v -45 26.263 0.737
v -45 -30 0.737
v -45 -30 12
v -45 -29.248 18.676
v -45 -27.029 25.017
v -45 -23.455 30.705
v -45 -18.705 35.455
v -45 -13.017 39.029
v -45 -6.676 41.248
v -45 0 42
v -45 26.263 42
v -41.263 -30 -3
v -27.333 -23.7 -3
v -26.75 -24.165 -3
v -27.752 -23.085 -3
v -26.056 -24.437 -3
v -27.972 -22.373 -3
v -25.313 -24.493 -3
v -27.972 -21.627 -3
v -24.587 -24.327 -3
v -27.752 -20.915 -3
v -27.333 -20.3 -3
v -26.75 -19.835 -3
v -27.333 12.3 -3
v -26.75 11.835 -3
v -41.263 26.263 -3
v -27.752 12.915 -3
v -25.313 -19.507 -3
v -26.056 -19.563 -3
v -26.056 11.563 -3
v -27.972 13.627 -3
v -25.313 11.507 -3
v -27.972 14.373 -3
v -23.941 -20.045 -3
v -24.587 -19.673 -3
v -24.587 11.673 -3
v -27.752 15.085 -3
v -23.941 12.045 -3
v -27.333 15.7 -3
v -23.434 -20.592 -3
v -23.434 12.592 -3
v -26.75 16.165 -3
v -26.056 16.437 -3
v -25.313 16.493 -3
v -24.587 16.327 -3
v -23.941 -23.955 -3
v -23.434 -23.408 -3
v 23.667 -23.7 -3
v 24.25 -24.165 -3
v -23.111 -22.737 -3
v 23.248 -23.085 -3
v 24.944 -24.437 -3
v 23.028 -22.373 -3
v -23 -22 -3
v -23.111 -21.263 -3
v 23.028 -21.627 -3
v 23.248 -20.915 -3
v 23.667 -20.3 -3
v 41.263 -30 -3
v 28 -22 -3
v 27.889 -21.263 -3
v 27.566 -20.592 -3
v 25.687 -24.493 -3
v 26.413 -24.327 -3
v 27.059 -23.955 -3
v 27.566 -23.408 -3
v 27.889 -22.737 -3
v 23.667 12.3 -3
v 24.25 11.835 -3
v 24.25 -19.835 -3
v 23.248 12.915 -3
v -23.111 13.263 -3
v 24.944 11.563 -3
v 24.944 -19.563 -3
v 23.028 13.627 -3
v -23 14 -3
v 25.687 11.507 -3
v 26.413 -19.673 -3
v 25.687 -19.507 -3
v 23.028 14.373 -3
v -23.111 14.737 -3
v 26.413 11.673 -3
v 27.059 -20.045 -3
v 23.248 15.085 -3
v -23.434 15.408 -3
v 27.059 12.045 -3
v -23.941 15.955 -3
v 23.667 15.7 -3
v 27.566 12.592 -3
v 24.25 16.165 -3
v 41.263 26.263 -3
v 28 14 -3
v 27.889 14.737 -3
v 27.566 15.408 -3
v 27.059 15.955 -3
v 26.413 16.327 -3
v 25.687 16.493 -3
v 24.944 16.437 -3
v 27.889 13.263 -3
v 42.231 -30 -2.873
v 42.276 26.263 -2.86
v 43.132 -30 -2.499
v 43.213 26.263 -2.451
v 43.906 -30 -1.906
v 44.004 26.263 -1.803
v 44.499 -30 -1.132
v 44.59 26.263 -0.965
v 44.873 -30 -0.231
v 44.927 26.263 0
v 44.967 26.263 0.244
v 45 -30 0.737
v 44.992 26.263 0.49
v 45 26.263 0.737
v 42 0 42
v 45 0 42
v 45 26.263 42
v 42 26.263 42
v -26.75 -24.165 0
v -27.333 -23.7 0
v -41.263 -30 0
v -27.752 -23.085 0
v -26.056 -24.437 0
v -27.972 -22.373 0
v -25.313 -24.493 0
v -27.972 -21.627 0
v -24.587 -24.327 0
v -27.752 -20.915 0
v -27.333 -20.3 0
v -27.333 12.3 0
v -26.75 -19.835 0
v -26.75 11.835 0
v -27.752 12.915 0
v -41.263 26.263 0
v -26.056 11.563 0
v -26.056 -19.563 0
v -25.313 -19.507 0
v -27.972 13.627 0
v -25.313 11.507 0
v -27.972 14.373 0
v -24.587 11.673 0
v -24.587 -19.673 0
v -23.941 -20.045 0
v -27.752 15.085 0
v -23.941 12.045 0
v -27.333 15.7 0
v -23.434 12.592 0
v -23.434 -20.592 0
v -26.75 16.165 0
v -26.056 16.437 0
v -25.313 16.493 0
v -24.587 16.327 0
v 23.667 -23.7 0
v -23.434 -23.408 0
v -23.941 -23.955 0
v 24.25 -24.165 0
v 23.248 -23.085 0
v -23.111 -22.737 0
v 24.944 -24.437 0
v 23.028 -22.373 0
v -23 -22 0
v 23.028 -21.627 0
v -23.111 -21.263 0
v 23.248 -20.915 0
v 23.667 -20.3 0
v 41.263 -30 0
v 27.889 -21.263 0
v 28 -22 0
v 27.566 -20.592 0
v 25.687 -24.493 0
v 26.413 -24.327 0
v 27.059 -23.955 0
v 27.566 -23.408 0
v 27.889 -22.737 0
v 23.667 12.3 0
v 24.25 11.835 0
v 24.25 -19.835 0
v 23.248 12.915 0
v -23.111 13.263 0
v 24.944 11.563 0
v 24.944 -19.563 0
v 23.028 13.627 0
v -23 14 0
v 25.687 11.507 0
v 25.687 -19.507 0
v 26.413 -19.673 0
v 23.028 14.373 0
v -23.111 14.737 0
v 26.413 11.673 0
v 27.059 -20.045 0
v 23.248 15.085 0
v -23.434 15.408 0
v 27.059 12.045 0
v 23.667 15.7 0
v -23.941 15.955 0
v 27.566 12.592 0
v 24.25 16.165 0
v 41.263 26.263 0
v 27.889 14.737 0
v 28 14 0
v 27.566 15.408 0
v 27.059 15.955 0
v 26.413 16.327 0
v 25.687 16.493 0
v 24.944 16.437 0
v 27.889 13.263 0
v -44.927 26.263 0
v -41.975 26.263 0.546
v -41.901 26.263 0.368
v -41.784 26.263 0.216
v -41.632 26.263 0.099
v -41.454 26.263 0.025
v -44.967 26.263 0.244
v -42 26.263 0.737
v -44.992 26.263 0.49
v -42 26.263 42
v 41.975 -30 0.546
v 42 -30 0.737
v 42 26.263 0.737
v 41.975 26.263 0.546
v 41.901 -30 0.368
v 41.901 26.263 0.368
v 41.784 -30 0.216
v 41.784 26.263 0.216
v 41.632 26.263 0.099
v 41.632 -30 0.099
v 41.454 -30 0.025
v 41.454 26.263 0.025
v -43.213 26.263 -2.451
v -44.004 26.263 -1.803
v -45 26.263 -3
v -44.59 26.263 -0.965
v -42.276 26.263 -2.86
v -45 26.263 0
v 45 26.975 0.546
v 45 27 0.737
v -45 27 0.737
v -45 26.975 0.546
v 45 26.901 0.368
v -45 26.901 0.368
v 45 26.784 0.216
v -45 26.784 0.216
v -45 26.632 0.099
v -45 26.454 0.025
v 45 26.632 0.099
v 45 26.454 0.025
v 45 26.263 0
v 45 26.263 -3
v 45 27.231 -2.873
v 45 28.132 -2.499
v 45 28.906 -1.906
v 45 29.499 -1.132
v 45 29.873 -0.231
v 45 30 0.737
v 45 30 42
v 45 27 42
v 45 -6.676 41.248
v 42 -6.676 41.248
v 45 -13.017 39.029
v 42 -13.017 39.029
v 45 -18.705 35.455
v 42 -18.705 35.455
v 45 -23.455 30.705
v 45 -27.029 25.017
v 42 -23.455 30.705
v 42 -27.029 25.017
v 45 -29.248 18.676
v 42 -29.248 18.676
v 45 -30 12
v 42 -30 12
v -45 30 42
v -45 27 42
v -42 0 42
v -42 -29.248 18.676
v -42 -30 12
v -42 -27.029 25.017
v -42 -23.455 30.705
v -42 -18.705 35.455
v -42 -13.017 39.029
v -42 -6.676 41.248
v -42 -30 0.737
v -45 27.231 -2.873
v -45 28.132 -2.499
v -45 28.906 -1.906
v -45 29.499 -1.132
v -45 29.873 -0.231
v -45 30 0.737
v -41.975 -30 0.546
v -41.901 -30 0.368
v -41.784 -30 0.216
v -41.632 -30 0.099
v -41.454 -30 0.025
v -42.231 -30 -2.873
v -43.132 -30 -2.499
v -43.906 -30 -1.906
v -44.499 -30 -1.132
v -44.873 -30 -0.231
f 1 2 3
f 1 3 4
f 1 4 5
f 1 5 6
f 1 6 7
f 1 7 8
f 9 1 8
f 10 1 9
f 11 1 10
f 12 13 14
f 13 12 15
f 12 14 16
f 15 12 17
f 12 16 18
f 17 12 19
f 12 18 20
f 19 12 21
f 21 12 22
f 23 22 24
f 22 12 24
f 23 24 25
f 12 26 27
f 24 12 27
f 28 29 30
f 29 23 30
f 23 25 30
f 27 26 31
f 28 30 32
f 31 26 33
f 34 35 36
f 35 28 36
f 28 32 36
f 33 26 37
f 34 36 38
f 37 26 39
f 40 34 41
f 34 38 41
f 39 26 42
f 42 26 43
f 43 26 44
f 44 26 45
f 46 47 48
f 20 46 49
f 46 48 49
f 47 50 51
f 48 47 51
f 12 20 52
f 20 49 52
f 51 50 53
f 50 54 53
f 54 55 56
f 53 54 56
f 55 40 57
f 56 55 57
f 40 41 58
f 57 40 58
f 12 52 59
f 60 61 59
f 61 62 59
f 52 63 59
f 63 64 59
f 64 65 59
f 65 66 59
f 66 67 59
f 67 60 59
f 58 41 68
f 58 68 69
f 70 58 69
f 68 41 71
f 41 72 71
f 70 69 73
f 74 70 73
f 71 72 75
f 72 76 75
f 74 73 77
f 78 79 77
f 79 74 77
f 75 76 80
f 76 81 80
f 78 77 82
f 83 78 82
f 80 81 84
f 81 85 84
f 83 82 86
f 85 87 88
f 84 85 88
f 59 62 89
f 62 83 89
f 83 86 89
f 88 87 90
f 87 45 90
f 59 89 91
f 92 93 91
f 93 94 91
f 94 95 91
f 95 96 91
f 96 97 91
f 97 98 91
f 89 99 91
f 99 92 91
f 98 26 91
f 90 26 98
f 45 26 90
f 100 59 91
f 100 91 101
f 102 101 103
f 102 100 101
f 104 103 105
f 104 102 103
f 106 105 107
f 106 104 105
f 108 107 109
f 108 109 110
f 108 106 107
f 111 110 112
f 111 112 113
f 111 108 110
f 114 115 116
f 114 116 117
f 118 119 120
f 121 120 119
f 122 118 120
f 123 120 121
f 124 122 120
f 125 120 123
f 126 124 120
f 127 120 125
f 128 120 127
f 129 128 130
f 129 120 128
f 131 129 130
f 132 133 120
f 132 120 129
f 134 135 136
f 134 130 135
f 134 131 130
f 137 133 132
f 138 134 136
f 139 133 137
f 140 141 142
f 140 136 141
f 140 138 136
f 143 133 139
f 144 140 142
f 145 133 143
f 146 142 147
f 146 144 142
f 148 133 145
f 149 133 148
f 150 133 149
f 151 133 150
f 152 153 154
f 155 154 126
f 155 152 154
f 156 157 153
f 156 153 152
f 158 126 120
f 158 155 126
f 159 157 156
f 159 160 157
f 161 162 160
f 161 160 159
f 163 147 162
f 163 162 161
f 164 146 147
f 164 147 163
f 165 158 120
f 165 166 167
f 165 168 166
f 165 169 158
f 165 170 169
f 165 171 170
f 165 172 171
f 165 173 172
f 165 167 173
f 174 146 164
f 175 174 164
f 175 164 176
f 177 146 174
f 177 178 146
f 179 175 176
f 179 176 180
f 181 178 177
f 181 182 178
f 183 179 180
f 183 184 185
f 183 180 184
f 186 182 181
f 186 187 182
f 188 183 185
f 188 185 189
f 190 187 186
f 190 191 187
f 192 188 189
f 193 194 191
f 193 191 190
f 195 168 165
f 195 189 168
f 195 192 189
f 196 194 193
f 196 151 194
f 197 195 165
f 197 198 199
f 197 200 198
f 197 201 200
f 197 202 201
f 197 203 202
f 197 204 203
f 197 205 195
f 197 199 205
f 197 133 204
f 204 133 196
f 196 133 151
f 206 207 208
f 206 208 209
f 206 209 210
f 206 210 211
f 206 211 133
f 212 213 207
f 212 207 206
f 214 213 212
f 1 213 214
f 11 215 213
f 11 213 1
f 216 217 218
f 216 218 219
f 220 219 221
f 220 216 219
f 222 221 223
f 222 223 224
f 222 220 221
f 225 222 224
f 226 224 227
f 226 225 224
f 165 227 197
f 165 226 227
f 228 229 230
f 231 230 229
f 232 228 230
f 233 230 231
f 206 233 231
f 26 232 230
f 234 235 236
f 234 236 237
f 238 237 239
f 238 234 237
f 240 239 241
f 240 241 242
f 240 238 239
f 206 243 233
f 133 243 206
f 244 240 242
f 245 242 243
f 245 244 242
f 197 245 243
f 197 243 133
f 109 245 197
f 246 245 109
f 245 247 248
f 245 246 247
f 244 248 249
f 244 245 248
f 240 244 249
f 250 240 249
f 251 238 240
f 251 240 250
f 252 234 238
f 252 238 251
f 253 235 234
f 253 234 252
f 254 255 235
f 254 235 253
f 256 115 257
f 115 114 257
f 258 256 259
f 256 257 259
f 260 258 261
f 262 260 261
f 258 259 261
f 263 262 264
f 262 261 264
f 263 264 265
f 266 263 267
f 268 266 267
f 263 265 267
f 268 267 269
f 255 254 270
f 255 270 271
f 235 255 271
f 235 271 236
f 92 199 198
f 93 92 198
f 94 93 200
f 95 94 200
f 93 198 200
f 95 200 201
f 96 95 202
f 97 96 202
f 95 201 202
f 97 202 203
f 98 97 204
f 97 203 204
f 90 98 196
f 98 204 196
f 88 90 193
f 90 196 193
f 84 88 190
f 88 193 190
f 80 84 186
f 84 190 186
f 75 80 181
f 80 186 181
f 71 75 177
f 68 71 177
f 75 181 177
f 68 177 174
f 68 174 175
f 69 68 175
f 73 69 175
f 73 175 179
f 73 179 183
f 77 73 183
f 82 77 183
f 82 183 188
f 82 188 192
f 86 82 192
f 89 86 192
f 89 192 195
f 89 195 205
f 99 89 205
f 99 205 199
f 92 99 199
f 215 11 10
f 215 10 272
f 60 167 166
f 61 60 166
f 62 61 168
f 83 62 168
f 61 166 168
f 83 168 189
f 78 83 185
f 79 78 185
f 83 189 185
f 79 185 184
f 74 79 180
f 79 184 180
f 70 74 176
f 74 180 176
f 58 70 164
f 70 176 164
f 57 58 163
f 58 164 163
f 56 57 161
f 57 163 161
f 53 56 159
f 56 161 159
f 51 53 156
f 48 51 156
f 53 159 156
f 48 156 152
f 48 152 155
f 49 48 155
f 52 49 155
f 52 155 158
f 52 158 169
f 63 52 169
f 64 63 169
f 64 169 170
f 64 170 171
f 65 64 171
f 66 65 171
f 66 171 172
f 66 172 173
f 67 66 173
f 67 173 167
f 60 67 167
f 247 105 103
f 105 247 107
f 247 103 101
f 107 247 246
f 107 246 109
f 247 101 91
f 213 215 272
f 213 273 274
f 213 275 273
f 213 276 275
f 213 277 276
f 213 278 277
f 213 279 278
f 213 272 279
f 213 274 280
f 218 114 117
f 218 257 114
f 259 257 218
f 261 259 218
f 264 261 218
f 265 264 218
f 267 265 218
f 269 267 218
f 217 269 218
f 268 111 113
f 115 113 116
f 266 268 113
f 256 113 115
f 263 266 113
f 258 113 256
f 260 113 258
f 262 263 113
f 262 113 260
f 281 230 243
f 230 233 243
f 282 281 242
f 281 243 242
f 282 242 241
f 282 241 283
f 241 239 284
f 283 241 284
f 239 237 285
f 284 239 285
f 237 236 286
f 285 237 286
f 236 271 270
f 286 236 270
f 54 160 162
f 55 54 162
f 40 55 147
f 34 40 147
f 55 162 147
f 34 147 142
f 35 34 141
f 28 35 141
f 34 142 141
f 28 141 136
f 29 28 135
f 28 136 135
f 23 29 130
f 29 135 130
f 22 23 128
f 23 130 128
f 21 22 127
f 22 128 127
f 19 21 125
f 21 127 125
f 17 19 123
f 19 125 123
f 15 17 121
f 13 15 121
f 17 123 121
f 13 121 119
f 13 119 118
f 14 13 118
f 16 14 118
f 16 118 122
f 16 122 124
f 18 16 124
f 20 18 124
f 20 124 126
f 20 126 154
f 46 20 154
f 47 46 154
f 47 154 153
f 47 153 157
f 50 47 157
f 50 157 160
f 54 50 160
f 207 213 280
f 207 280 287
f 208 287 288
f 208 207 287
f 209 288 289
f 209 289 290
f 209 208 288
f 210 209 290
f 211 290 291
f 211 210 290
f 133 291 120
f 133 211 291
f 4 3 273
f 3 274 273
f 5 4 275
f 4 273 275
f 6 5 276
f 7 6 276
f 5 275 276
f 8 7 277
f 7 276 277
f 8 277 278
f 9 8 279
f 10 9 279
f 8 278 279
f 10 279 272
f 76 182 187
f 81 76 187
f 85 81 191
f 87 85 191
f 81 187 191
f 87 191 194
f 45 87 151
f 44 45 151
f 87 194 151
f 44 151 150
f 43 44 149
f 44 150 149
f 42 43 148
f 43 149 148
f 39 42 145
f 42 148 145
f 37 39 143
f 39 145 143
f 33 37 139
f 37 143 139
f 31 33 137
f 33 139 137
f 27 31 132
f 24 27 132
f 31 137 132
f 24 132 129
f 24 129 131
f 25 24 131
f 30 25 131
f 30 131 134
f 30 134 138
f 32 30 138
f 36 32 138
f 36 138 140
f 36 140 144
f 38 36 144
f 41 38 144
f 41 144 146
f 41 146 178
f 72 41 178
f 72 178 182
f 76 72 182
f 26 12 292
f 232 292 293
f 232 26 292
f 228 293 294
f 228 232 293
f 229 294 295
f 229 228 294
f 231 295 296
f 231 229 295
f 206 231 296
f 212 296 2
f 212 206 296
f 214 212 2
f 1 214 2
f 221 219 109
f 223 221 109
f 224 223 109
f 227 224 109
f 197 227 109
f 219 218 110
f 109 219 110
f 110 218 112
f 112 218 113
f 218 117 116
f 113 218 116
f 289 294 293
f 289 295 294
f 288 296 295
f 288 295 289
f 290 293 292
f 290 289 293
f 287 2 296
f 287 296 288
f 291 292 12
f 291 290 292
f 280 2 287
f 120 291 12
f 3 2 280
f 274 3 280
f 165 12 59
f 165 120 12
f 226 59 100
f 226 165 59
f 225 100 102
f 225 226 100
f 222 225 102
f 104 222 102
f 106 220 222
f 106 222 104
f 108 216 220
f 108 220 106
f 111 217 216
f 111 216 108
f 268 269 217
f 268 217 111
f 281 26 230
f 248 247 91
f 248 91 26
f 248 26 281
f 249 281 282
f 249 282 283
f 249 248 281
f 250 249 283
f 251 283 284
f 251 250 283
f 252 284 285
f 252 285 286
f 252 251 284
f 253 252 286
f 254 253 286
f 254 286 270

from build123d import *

# Parameters (mm, degrees)
SKETCH_2_W                         = 90
SKETCH_2_H                         = 60
SM_BASE_FLANGE_1_DEPTH             = 3
SM_EDGE_FLANGE_1_STRIP_W           = 13.4732
SM_EDGE_FLANGE_1_STRIP_H           = 3
SM_EDGE_FLANGE_1_STRIP_CUT_DEPTH   = 90
SM_EDGE_FLANGE_1_DEPTH             = 90
SM_EDGE_FLANGE_2_STRIP_W           = 13.4732
SM_EDGE_FLANGE_2_STRIP_H           = 3
SM_EDGE_FLANGE_2_STRIP_CUT_DEPTH   = 56.2634
SM_EDGE_FLANGE_2_STRIP_2_W         = 13.4732
SM_EDGE_FLANGE_2_STRIP_2_H         = 3
SM_EDGE_FLANGE_2_STRIP_CUT_2_DEPTH = 56.2634
SM_EDGE_FLANGE_2_DEPTH             = 56.2634
SM_EDGE_FLANGE_2_BEND_DEPTH        = 56.2634
HOLE_WIZARD_M6_1_D                 = 5
FILLET_1_R                         = 30


# Sheet-metal steps are written as plain solids
with BuildPart() as part:
    # Sketch 2 → 基体-法兰1 (new body)
    with BuildSketch(Plane.XY):
        Rectangle(SKETCH_2_W, SKETCH_2_H)
    extrude(amount=-SM_BASE_FLANGE_1_DEPTH)

    # 边线-法兰1 strip (across the edge) → 边线-法兰1 strip cut (cut)
    with BuildSketch(Plane(origin=(45, 30, 0), x_dir=(0, -1, 0), z_dir=(-1, 0, 0))):
        with Locations((-3, -1.5)):
            Rectangle(SM_EDGE_FLANGE_1_STRIP_W, SM_EDGE_FLANGE_1_STRIP_H)
    extrude(amount=SM_EDGE_FLANGE_1_STRIP_CUT_DEPTH, mode=Mode.SUBTRACT)

    # 边线-法兰1 section (across the edge) → 边线-法兰1 (add)
    with BuildSketch(Plane(origin=(45, 30, 0), x_dir=(0, -1, 0), z_dir=(-1, 0, 0))):
        with BuildLine():
            Line((0, 0.7366), (0, 42))
            Line((0, 42), (3, 42))
            Line((3, 42), (3, 0.7366))
            ThreePointArc((3, 0.7366), (3.215745145, 0.215745145), (3.7366, 0))
            Line((3.7366, 0), (3.7366, -3))
            ThreePointArc((3.7366, -3), (1.094424801, -1.905575199), (0, 0.7366))
        make_face()
    extrude(amount=SM_EDGE_FLANGE_1_DEPTH)

    # 边线-法兰2 strip (across the edge) → 边线-法兰2 strip cut (cut)
    with BuildSketch(Plane(origin=(-45, 26.2634, 0), x_dir=(1, 0, 0), z_dir=(0, -1, 0))):
        with Locations((-3, -1.5)):
            Rectangle(SM_EDGE_FLANGE_2_STRIP_W, SM_EDGE_FLANGE_2_STRIP_H)
    extrude(amount=SM_EDGE_FLANGE_2_STRIP_CUT_DEPTH, mode=Mode.SUBTRACT)

    # 边线-法兰2 strip 2 (across the edge) → 边线-法兰2 strip cut 2 (cut)
    with BuildSketch(Plane(origin=(45, -30, 0), x_dir=(-1, 0, 0), z_dir=(0, 1, 0))):
        with Locations((-3, -1.5)):
            Rectangle(SM_EDGE_FLANGE_2_STRIP_2_W, SM_EDGE_FLANGE_2_STRIP_2_H)
    extrude(amount=SM_EDGE_FLANGE_2_STRIP_CUT_2_DEPTH, mode=Mode.SUBTRACT)

    # 边线-法兰2 section (across the edge) → 边线-法兰2 (add)
    with BuildSketch(Plane(origin=(-45, 26.2634, 0), x_dir=(1, 0, 0), z_dir=(0, -1, 0))):
        with BuildLine():
            Line((0, 0.7366), (0, 42))
            Line((0, 42), (3, 42))
            Line((3, 42), (3, 0.7366))
            ThreePointArc((3, 0.7366), (3.215745145, 0.215745145), (3.7366, 0))
            Line((3.7366, 0), (3.7366, -3))
            ThreePointArc((3.7366, -3), (1.094424801, -1.905575199), (0, 0.7366))
        make_face()
    extrude(amount=SM_EDGE_FLANGE_2_DEPTH)

    # 边线-法兰2 section 2 (across the edge) → 边线-法兰2 bend (add)
    with BuildSketch(Plane(origin=(45, -30, 0), x_dir=(-1, 0, 0), z_dir=(0, 1, 0))):
        with BuildLine():
            Line((0, 0.7366), (0, 42))
            Line((0, 42), (3, 42))
            Line((3, 42), (3, 0.7366))
            ThreePointArc((3, 0.7366), (3.215745145, 0.215745145), (3.7366, 0))
            Line((3.7366, 0), (3.7366, -3))
            ThreePointArc((3.7366, -3), (1.094424801, -1.905575199), (0, 0.7366))
        make_face()
    extrude(amount=SM_EDGE_FLANGE_2_BEND_DEPTH)

    # M6 螺纹孔1 (through all)
    with Locations(Plane(origin=(0, 0, -3), x_dir=(-1, 0, 0), z_dir=(0, 0, -1))):
        with Locations((-25.5, 14), (-25.5, -22), (25.5, -22), (25.5, 14)):
            Hole(HOLE_WIZARD_M6_1_D / 2)

    # 圆角1
    fillet_1_edges = [part.edges().sort_by_distance(p)[0] for p in [
        (43.5, -30, 42),
        (-43.5, -30, 42),
    ]]
    fillet(fillet_1_edges, radius=FILLET_1_R)


solid = part.part
